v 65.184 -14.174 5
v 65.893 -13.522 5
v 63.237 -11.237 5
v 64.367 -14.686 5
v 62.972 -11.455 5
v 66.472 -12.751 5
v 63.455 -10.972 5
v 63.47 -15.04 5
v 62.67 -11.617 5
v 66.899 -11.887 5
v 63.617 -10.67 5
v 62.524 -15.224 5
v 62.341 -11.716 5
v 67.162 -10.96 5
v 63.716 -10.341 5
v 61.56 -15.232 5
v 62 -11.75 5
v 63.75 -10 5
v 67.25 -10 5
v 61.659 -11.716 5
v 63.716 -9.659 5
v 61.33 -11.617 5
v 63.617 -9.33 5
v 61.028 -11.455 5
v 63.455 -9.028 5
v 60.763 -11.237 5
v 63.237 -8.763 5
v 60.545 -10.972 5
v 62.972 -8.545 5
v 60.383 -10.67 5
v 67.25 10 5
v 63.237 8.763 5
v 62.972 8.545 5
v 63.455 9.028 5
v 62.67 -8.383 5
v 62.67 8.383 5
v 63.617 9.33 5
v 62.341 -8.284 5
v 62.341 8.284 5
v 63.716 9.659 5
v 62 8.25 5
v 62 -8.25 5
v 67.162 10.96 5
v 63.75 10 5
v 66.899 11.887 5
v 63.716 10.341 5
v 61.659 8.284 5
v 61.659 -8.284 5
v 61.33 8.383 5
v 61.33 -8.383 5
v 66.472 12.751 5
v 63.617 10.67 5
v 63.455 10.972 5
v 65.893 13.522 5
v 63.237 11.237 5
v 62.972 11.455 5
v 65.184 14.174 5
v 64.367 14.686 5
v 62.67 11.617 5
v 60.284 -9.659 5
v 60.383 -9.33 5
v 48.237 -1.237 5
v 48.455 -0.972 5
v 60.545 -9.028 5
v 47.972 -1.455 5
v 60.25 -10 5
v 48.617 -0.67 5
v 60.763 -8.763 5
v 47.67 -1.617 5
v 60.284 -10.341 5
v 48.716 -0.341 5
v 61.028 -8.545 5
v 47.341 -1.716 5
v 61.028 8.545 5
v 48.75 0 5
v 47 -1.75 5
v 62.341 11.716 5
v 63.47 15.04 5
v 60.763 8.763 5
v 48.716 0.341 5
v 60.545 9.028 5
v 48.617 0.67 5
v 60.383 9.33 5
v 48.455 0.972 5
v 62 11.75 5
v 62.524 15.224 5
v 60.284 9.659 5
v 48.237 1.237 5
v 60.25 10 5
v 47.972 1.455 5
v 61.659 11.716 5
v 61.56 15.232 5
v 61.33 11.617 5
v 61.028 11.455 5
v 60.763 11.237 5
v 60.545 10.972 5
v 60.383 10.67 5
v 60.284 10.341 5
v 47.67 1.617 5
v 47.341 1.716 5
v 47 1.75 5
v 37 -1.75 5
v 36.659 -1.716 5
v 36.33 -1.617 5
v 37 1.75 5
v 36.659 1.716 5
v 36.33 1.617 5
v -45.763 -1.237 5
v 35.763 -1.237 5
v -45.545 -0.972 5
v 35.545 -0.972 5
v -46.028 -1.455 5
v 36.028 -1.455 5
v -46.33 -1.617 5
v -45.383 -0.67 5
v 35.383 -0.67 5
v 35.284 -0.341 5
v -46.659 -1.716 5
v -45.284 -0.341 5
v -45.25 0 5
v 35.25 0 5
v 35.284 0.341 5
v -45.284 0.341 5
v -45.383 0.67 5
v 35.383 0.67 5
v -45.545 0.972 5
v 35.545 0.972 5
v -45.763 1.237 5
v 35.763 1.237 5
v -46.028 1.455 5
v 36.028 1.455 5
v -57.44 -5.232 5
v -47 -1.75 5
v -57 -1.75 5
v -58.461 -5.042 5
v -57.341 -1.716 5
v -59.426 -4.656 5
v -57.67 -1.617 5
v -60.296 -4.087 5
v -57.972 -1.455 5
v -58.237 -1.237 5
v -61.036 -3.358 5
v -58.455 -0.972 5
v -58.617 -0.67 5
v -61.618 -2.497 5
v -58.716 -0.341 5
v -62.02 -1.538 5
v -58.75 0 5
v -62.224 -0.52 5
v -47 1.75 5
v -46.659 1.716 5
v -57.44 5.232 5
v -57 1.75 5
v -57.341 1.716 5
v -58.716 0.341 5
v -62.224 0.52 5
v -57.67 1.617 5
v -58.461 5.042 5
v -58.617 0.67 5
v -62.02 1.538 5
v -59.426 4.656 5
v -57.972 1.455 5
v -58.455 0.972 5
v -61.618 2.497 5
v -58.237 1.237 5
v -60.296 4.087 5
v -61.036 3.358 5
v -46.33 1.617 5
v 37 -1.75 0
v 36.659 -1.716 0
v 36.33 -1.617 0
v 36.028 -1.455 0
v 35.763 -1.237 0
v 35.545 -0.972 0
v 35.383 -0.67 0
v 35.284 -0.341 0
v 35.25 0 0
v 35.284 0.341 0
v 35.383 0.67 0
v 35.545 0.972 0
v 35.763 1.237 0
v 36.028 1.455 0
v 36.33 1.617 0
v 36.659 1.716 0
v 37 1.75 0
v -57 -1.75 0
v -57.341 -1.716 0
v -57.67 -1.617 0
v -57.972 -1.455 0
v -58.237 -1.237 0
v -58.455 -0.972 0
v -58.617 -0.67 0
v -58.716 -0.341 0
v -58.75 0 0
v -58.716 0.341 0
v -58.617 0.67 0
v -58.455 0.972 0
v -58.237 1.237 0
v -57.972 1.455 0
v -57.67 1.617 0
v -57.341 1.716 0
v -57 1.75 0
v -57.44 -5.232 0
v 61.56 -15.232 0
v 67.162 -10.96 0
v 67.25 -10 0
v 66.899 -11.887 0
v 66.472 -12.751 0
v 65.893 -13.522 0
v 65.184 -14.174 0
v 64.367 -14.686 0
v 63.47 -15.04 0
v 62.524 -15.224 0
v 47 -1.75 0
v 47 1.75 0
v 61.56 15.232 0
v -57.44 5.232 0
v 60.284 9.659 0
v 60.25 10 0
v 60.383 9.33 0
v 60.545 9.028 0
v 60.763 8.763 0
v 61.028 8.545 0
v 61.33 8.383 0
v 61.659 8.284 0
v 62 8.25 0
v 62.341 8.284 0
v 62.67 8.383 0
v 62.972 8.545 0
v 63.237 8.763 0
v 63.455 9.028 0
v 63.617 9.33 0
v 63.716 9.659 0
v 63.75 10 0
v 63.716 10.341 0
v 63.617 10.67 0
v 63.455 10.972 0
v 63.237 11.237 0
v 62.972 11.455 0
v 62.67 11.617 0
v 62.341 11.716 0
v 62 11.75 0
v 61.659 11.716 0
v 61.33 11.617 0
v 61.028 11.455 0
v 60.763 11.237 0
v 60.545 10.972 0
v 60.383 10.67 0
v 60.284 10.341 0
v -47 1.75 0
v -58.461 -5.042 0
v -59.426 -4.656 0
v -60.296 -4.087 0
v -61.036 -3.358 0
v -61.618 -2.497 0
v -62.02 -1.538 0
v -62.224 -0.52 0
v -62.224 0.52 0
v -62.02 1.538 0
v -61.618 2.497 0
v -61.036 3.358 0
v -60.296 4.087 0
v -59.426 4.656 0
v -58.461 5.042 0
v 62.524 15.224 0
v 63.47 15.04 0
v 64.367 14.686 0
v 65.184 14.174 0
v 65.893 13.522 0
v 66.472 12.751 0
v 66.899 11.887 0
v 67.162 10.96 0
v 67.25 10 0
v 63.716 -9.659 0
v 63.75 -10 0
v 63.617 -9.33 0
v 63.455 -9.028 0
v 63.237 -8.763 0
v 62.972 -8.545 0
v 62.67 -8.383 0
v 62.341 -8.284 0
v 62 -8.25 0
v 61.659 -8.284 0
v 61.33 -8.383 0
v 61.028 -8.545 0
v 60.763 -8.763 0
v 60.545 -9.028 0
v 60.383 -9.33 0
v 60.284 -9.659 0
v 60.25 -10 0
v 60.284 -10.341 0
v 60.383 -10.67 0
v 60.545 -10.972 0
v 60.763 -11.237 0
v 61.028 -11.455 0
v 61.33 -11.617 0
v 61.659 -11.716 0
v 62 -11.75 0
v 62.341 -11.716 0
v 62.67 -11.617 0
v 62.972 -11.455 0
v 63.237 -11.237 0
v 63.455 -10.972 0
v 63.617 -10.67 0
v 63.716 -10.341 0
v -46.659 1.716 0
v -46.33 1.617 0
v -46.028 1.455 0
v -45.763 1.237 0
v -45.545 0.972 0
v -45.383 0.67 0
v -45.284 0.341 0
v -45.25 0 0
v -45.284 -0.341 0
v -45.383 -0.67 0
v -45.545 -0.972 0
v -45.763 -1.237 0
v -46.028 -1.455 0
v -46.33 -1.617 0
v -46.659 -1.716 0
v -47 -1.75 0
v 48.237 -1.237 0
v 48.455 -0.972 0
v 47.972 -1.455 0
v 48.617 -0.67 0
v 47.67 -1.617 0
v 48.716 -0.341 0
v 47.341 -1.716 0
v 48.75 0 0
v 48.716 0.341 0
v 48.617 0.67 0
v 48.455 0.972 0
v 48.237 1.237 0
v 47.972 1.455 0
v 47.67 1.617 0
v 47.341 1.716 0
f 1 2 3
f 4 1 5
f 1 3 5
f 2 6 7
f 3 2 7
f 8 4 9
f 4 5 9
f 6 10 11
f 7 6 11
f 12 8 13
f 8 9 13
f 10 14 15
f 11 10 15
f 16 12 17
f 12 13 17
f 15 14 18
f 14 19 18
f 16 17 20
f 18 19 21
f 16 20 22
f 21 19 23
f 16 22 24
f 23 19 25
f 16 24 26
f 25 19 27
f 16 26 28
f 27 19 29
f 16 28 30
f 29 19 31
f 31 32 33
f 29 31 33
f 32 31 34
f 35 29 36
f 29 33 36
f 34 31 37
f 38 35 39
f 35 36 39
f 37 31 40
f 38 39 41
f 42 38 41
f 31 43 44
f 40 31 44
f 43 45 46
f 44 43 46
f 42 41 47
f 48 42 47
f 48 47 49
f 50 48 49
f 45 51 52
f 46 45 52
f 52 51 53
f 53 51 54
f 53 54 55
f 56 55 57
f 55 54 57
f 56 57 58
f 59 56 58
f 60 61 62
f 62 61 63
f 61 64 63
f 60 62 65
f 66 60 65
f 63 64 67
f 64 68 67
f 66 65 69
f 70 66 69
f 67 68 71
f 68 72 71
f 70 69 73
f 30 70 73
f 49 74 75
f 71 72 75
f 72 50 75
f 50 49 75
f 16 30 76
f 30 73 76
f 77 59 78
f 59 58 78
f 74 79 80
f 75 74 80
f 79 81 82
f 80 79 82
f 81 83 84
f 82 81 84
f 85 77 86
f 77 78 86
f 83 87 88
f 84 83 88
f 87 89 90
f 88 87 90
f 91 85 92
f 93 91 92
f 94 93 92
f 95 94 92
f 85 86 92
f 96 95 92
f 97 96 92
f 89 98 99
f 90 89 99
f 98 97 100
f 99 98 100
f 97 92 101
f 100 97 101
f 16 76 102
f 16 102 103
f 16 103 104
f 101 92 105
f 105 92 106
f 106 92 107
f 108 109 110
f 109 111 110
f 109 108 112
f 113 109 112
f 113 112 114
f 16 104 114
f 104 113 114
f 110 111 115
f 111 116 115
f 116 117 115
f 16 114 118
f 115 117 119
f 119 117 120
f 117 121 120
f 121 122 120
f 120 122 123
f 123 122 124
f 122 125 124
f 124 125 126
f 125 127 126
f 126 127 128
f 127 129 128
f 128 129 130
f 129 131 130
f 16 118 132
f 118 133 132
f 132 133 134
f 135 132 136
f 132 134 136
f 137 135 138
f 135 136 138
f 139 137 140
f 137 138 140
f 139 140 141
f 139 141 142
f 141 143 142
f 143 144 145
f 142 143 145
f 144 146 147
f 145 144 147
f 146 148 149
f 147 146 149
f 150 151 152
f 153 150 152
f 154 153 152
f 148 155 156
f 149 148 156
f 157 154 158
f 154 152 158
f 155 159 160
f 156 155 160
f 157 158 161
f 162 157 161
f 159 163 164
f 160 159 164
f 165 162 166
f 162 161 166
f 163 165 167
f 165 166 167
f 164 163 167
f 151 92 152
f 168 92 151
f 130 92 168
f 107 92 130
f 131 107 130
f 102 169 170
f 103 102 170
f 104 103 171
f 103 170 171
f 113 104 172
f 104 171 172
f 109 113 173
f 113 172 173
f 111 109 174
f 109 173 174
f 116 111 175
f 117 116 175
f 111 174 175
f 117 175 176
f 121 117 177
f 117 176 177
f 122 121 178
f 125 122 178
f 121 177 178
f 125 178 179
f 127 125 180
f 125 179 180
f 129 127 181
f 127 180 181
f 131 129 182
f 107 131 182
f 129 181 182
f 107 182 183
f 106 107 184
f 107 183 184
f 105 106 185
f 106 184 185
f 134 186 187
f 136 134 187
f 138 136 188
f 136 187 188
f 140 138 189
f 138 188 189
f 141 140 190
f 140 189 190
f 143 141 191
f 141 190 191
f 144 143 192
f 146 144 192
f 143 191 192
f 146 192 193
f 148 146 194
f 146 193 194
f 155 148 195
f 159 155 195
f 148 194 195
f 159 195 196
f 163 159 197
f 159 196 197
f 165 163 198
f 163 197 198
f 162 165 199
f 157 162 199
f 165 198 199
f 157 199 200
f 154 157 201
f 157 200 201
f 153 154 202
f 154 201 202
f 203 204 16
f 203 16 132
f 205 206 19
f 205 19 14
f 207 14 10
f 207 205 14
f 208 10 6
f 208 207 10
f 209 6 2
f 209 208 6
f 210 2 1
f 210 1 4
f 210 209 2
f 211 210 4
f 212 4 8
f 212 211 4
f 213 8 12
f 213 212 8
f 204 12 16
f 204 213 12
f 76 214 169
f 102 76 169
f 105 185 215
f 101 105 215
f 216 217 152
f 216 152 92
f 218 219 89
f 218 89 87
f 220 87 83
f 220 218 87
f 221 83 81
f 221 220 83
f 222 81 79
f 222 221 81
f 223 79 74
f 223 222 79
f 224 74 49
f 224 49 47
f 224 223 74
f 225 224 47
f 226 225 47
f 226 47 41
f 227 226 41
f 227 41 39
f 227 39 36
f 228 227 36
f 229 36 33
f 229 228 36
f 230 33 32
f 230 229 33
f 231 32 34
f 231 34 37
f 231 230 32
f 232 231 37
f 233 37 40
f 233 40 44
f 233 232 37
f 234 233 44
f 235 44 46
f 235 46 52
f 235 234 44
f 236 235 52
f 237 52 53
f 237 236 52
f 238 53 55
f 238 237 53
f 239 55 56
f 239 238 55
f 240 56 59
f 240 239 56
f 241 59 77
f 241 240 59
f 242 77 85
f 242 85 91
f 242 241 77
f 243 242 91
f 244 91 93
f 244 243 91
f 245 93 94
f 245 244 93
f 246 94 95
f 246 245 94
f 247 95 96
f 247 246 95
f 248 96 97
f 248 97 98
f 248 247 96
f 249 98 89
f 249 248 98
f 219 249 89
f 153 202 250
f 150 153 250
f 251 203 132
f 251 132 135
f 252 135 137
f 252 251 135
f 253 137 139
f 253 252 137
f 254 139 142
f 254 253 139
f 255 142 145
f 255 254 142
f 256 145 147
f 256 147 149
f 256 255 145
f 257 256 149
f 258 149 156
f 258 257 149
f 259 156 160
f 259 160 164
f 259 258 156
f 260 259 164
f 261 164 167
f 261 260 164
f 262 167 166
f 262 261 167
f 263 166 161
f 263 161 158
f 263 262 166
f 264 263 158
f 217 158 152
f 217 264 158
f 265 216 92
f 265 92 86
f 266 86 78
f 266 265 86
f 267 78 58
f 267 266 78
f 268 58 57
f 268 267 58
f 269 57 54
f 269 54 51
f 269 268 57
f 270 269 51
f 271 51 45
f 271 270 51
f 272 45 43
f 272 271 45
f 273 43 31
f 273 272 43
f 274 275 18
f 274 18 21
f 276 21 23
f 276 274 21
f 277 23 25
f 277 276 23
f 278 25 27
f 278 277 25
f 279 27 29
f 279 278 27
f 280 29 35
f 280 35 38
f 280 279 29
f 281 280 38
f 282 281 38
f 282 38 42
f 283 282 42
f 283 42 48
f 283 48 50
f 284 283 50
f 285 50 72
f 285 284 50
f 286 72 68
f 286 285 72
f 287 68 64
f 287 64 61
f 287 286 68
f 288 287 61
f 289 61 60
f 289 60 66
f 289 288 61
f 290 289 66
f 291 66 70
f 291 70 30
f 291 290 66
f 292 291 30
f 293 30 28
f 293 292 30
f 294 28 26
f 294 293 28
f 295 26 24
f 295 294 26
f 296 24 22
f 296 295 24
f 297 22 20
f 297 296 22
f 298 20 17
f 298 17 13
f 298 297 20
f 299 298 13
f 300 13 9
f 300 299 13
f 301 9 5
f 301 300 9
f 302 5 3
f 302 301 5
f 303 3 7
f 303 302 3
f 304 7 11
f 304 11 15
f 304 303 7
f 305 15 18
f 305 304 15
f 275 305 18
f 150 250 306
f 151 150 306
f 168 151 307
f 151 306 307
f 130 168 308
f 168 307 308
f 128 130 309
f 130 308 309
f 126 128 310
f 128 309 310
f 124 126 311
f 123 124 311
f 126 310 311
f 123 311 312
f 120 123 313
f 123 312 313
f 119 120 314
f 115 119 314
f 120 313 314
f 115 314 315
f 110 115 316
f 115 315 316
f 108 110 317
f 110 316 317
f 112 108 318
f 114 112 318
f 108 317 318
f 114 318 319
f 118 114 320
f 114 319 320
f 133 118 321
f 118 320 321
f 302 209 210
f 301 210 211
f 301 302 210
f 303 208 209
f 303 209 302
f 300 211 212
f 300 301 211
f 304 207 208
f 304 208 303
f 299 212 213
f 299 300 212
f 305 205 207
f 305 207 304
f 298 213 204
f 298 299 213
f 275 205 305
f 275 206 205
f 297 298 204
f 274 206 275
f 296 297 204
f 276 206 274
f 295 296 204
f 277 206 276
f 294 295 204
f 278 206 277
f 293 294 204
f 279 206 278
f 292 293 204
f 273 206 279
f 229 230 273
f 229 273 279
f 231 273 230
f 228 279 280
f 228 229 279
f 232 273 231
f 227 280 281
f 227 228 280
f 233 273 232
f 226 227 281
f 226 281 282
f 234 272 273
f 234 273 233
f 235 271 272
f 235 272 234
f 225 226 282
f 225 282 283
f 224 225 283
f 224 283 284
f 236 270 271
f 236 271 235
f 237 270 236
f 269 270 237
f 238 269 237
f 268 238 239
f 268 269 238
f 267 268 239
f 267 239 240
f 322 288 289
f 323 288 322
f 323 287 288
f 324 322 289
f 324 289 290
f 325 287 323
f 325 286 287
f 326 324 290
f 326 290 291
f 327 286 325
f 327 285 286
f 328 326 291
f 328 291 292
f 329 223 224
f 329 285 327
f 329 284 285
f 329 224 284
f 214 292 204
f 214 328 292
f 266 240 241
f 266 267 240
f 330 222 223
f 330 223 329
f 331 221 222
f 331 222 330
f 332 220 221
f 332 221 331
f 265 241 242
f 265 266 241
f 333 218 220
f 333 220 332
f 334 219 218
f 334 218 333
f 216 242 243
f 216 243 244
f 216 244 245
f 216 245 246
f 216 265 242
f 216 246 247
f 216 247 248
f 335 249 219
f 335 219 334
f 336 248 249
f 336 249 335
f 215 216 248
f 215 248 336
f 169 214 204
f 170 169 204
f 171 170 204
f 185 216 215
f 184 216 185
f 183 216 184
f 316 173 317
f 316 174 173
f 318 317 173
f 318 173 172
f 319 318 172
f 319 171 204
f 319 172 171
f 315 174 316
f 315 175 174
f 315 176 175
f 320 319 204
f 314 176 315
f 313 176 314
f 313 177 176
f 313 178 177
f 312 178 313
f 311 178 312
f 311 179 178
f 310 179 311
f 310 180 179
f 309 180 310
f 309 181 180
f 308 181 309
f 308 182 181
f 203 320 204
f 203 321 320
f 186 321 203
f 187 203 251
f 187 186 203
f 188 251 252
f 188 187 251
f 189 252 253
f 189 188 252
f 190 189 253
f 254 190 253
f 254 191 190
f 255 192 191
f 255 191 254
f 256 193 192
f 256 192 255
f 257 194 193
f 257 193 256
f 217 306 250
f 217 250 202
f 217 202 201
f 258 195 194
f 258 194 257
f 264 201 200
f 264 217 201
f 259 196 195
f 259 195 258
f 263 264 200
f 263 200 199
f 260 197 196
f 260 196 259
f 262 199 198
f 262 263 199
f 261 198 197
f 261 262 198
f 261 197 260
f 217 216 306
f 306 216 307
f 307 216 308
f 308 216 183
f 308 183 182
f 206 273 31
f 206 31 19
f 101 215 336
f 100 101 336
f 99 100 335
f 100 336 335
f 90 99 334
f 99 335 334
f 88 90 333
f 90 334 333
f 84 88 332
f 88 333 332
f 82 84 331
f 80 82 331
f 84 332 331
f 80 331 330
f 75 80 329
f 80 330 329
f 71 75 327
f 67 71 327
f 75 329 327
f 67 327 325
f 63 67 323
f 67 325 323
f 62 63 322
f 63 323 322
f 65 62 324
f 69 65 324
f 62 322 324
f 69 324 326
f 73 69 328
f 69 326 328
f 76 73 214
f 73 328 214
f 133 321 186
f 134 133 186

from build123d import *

# Parameters (mm, degrees)
ESBO_O1_R                = 1.75
RESSALTO_EXTRUS_O1_DEPTH = 5


with BuildPart() as part:
    # Esboço1 → Ressalto-extrusão1 (new body)
    with BuildSketch(Plane.XY):
        with BuildLine():
            Line((67.25, 10), (67.25, -10))
            ThreePointArc((67.25, -10), (65.553481285, -13.864617802), (61.560373044, -15.231560775))
            Line((61.560373044, -15.231560775), (-57.439626956, -5.231560775))
            ThreePointArc((-57.439626956, -5.231560775), (-62.25, 0), (-57.439626956, 5.231560775))
            Line((-57.439626956, 5.231560775), (61.560373044, 15.231560775))
            ThreePointArc((61.560373044, 15.231560775), (65.553481285, 13.864617802), (67.25, 10))
        make_face()
        with Locations((62, -10)):
            Circle(ESBO_O1_R, mode=Mode.SUBTRACT)
        with Locations(Location((62, 10, 0), (0, 0, 180))):
            Circle(ESBO_O1_R, mode=Mode.SUBTRACT)
        with BuildLine():
            Line((47, -1.75), (37, -1.75))
            ThreePointArc((37, -1.75), (35.25, 0), (37, 1.75))
            Line((37, 1.75), (47, 1.75))
            ThreePointArc((47, 1.75), (48.75, 0), (47, -1.75))
        make_face(mode=Mode.SUBTRACT)
        with BuildLine():
            Line((-47, -1.75), (-57, -1.75))
            ThreePointArc((-57, -1.75), (-58.75, 0), (-57, 1.75))
            Line((-57, 1.75), (-47, 1.75))
            ThreePointArc((-47, 1.75), (-45.25, 0), (-47, -1.75))
        make_face(mode=Mode.SUBTRACT)
    extrude(amount=RESSALTO_EXTRUS_O1_DEPTH)


solid = part.part
